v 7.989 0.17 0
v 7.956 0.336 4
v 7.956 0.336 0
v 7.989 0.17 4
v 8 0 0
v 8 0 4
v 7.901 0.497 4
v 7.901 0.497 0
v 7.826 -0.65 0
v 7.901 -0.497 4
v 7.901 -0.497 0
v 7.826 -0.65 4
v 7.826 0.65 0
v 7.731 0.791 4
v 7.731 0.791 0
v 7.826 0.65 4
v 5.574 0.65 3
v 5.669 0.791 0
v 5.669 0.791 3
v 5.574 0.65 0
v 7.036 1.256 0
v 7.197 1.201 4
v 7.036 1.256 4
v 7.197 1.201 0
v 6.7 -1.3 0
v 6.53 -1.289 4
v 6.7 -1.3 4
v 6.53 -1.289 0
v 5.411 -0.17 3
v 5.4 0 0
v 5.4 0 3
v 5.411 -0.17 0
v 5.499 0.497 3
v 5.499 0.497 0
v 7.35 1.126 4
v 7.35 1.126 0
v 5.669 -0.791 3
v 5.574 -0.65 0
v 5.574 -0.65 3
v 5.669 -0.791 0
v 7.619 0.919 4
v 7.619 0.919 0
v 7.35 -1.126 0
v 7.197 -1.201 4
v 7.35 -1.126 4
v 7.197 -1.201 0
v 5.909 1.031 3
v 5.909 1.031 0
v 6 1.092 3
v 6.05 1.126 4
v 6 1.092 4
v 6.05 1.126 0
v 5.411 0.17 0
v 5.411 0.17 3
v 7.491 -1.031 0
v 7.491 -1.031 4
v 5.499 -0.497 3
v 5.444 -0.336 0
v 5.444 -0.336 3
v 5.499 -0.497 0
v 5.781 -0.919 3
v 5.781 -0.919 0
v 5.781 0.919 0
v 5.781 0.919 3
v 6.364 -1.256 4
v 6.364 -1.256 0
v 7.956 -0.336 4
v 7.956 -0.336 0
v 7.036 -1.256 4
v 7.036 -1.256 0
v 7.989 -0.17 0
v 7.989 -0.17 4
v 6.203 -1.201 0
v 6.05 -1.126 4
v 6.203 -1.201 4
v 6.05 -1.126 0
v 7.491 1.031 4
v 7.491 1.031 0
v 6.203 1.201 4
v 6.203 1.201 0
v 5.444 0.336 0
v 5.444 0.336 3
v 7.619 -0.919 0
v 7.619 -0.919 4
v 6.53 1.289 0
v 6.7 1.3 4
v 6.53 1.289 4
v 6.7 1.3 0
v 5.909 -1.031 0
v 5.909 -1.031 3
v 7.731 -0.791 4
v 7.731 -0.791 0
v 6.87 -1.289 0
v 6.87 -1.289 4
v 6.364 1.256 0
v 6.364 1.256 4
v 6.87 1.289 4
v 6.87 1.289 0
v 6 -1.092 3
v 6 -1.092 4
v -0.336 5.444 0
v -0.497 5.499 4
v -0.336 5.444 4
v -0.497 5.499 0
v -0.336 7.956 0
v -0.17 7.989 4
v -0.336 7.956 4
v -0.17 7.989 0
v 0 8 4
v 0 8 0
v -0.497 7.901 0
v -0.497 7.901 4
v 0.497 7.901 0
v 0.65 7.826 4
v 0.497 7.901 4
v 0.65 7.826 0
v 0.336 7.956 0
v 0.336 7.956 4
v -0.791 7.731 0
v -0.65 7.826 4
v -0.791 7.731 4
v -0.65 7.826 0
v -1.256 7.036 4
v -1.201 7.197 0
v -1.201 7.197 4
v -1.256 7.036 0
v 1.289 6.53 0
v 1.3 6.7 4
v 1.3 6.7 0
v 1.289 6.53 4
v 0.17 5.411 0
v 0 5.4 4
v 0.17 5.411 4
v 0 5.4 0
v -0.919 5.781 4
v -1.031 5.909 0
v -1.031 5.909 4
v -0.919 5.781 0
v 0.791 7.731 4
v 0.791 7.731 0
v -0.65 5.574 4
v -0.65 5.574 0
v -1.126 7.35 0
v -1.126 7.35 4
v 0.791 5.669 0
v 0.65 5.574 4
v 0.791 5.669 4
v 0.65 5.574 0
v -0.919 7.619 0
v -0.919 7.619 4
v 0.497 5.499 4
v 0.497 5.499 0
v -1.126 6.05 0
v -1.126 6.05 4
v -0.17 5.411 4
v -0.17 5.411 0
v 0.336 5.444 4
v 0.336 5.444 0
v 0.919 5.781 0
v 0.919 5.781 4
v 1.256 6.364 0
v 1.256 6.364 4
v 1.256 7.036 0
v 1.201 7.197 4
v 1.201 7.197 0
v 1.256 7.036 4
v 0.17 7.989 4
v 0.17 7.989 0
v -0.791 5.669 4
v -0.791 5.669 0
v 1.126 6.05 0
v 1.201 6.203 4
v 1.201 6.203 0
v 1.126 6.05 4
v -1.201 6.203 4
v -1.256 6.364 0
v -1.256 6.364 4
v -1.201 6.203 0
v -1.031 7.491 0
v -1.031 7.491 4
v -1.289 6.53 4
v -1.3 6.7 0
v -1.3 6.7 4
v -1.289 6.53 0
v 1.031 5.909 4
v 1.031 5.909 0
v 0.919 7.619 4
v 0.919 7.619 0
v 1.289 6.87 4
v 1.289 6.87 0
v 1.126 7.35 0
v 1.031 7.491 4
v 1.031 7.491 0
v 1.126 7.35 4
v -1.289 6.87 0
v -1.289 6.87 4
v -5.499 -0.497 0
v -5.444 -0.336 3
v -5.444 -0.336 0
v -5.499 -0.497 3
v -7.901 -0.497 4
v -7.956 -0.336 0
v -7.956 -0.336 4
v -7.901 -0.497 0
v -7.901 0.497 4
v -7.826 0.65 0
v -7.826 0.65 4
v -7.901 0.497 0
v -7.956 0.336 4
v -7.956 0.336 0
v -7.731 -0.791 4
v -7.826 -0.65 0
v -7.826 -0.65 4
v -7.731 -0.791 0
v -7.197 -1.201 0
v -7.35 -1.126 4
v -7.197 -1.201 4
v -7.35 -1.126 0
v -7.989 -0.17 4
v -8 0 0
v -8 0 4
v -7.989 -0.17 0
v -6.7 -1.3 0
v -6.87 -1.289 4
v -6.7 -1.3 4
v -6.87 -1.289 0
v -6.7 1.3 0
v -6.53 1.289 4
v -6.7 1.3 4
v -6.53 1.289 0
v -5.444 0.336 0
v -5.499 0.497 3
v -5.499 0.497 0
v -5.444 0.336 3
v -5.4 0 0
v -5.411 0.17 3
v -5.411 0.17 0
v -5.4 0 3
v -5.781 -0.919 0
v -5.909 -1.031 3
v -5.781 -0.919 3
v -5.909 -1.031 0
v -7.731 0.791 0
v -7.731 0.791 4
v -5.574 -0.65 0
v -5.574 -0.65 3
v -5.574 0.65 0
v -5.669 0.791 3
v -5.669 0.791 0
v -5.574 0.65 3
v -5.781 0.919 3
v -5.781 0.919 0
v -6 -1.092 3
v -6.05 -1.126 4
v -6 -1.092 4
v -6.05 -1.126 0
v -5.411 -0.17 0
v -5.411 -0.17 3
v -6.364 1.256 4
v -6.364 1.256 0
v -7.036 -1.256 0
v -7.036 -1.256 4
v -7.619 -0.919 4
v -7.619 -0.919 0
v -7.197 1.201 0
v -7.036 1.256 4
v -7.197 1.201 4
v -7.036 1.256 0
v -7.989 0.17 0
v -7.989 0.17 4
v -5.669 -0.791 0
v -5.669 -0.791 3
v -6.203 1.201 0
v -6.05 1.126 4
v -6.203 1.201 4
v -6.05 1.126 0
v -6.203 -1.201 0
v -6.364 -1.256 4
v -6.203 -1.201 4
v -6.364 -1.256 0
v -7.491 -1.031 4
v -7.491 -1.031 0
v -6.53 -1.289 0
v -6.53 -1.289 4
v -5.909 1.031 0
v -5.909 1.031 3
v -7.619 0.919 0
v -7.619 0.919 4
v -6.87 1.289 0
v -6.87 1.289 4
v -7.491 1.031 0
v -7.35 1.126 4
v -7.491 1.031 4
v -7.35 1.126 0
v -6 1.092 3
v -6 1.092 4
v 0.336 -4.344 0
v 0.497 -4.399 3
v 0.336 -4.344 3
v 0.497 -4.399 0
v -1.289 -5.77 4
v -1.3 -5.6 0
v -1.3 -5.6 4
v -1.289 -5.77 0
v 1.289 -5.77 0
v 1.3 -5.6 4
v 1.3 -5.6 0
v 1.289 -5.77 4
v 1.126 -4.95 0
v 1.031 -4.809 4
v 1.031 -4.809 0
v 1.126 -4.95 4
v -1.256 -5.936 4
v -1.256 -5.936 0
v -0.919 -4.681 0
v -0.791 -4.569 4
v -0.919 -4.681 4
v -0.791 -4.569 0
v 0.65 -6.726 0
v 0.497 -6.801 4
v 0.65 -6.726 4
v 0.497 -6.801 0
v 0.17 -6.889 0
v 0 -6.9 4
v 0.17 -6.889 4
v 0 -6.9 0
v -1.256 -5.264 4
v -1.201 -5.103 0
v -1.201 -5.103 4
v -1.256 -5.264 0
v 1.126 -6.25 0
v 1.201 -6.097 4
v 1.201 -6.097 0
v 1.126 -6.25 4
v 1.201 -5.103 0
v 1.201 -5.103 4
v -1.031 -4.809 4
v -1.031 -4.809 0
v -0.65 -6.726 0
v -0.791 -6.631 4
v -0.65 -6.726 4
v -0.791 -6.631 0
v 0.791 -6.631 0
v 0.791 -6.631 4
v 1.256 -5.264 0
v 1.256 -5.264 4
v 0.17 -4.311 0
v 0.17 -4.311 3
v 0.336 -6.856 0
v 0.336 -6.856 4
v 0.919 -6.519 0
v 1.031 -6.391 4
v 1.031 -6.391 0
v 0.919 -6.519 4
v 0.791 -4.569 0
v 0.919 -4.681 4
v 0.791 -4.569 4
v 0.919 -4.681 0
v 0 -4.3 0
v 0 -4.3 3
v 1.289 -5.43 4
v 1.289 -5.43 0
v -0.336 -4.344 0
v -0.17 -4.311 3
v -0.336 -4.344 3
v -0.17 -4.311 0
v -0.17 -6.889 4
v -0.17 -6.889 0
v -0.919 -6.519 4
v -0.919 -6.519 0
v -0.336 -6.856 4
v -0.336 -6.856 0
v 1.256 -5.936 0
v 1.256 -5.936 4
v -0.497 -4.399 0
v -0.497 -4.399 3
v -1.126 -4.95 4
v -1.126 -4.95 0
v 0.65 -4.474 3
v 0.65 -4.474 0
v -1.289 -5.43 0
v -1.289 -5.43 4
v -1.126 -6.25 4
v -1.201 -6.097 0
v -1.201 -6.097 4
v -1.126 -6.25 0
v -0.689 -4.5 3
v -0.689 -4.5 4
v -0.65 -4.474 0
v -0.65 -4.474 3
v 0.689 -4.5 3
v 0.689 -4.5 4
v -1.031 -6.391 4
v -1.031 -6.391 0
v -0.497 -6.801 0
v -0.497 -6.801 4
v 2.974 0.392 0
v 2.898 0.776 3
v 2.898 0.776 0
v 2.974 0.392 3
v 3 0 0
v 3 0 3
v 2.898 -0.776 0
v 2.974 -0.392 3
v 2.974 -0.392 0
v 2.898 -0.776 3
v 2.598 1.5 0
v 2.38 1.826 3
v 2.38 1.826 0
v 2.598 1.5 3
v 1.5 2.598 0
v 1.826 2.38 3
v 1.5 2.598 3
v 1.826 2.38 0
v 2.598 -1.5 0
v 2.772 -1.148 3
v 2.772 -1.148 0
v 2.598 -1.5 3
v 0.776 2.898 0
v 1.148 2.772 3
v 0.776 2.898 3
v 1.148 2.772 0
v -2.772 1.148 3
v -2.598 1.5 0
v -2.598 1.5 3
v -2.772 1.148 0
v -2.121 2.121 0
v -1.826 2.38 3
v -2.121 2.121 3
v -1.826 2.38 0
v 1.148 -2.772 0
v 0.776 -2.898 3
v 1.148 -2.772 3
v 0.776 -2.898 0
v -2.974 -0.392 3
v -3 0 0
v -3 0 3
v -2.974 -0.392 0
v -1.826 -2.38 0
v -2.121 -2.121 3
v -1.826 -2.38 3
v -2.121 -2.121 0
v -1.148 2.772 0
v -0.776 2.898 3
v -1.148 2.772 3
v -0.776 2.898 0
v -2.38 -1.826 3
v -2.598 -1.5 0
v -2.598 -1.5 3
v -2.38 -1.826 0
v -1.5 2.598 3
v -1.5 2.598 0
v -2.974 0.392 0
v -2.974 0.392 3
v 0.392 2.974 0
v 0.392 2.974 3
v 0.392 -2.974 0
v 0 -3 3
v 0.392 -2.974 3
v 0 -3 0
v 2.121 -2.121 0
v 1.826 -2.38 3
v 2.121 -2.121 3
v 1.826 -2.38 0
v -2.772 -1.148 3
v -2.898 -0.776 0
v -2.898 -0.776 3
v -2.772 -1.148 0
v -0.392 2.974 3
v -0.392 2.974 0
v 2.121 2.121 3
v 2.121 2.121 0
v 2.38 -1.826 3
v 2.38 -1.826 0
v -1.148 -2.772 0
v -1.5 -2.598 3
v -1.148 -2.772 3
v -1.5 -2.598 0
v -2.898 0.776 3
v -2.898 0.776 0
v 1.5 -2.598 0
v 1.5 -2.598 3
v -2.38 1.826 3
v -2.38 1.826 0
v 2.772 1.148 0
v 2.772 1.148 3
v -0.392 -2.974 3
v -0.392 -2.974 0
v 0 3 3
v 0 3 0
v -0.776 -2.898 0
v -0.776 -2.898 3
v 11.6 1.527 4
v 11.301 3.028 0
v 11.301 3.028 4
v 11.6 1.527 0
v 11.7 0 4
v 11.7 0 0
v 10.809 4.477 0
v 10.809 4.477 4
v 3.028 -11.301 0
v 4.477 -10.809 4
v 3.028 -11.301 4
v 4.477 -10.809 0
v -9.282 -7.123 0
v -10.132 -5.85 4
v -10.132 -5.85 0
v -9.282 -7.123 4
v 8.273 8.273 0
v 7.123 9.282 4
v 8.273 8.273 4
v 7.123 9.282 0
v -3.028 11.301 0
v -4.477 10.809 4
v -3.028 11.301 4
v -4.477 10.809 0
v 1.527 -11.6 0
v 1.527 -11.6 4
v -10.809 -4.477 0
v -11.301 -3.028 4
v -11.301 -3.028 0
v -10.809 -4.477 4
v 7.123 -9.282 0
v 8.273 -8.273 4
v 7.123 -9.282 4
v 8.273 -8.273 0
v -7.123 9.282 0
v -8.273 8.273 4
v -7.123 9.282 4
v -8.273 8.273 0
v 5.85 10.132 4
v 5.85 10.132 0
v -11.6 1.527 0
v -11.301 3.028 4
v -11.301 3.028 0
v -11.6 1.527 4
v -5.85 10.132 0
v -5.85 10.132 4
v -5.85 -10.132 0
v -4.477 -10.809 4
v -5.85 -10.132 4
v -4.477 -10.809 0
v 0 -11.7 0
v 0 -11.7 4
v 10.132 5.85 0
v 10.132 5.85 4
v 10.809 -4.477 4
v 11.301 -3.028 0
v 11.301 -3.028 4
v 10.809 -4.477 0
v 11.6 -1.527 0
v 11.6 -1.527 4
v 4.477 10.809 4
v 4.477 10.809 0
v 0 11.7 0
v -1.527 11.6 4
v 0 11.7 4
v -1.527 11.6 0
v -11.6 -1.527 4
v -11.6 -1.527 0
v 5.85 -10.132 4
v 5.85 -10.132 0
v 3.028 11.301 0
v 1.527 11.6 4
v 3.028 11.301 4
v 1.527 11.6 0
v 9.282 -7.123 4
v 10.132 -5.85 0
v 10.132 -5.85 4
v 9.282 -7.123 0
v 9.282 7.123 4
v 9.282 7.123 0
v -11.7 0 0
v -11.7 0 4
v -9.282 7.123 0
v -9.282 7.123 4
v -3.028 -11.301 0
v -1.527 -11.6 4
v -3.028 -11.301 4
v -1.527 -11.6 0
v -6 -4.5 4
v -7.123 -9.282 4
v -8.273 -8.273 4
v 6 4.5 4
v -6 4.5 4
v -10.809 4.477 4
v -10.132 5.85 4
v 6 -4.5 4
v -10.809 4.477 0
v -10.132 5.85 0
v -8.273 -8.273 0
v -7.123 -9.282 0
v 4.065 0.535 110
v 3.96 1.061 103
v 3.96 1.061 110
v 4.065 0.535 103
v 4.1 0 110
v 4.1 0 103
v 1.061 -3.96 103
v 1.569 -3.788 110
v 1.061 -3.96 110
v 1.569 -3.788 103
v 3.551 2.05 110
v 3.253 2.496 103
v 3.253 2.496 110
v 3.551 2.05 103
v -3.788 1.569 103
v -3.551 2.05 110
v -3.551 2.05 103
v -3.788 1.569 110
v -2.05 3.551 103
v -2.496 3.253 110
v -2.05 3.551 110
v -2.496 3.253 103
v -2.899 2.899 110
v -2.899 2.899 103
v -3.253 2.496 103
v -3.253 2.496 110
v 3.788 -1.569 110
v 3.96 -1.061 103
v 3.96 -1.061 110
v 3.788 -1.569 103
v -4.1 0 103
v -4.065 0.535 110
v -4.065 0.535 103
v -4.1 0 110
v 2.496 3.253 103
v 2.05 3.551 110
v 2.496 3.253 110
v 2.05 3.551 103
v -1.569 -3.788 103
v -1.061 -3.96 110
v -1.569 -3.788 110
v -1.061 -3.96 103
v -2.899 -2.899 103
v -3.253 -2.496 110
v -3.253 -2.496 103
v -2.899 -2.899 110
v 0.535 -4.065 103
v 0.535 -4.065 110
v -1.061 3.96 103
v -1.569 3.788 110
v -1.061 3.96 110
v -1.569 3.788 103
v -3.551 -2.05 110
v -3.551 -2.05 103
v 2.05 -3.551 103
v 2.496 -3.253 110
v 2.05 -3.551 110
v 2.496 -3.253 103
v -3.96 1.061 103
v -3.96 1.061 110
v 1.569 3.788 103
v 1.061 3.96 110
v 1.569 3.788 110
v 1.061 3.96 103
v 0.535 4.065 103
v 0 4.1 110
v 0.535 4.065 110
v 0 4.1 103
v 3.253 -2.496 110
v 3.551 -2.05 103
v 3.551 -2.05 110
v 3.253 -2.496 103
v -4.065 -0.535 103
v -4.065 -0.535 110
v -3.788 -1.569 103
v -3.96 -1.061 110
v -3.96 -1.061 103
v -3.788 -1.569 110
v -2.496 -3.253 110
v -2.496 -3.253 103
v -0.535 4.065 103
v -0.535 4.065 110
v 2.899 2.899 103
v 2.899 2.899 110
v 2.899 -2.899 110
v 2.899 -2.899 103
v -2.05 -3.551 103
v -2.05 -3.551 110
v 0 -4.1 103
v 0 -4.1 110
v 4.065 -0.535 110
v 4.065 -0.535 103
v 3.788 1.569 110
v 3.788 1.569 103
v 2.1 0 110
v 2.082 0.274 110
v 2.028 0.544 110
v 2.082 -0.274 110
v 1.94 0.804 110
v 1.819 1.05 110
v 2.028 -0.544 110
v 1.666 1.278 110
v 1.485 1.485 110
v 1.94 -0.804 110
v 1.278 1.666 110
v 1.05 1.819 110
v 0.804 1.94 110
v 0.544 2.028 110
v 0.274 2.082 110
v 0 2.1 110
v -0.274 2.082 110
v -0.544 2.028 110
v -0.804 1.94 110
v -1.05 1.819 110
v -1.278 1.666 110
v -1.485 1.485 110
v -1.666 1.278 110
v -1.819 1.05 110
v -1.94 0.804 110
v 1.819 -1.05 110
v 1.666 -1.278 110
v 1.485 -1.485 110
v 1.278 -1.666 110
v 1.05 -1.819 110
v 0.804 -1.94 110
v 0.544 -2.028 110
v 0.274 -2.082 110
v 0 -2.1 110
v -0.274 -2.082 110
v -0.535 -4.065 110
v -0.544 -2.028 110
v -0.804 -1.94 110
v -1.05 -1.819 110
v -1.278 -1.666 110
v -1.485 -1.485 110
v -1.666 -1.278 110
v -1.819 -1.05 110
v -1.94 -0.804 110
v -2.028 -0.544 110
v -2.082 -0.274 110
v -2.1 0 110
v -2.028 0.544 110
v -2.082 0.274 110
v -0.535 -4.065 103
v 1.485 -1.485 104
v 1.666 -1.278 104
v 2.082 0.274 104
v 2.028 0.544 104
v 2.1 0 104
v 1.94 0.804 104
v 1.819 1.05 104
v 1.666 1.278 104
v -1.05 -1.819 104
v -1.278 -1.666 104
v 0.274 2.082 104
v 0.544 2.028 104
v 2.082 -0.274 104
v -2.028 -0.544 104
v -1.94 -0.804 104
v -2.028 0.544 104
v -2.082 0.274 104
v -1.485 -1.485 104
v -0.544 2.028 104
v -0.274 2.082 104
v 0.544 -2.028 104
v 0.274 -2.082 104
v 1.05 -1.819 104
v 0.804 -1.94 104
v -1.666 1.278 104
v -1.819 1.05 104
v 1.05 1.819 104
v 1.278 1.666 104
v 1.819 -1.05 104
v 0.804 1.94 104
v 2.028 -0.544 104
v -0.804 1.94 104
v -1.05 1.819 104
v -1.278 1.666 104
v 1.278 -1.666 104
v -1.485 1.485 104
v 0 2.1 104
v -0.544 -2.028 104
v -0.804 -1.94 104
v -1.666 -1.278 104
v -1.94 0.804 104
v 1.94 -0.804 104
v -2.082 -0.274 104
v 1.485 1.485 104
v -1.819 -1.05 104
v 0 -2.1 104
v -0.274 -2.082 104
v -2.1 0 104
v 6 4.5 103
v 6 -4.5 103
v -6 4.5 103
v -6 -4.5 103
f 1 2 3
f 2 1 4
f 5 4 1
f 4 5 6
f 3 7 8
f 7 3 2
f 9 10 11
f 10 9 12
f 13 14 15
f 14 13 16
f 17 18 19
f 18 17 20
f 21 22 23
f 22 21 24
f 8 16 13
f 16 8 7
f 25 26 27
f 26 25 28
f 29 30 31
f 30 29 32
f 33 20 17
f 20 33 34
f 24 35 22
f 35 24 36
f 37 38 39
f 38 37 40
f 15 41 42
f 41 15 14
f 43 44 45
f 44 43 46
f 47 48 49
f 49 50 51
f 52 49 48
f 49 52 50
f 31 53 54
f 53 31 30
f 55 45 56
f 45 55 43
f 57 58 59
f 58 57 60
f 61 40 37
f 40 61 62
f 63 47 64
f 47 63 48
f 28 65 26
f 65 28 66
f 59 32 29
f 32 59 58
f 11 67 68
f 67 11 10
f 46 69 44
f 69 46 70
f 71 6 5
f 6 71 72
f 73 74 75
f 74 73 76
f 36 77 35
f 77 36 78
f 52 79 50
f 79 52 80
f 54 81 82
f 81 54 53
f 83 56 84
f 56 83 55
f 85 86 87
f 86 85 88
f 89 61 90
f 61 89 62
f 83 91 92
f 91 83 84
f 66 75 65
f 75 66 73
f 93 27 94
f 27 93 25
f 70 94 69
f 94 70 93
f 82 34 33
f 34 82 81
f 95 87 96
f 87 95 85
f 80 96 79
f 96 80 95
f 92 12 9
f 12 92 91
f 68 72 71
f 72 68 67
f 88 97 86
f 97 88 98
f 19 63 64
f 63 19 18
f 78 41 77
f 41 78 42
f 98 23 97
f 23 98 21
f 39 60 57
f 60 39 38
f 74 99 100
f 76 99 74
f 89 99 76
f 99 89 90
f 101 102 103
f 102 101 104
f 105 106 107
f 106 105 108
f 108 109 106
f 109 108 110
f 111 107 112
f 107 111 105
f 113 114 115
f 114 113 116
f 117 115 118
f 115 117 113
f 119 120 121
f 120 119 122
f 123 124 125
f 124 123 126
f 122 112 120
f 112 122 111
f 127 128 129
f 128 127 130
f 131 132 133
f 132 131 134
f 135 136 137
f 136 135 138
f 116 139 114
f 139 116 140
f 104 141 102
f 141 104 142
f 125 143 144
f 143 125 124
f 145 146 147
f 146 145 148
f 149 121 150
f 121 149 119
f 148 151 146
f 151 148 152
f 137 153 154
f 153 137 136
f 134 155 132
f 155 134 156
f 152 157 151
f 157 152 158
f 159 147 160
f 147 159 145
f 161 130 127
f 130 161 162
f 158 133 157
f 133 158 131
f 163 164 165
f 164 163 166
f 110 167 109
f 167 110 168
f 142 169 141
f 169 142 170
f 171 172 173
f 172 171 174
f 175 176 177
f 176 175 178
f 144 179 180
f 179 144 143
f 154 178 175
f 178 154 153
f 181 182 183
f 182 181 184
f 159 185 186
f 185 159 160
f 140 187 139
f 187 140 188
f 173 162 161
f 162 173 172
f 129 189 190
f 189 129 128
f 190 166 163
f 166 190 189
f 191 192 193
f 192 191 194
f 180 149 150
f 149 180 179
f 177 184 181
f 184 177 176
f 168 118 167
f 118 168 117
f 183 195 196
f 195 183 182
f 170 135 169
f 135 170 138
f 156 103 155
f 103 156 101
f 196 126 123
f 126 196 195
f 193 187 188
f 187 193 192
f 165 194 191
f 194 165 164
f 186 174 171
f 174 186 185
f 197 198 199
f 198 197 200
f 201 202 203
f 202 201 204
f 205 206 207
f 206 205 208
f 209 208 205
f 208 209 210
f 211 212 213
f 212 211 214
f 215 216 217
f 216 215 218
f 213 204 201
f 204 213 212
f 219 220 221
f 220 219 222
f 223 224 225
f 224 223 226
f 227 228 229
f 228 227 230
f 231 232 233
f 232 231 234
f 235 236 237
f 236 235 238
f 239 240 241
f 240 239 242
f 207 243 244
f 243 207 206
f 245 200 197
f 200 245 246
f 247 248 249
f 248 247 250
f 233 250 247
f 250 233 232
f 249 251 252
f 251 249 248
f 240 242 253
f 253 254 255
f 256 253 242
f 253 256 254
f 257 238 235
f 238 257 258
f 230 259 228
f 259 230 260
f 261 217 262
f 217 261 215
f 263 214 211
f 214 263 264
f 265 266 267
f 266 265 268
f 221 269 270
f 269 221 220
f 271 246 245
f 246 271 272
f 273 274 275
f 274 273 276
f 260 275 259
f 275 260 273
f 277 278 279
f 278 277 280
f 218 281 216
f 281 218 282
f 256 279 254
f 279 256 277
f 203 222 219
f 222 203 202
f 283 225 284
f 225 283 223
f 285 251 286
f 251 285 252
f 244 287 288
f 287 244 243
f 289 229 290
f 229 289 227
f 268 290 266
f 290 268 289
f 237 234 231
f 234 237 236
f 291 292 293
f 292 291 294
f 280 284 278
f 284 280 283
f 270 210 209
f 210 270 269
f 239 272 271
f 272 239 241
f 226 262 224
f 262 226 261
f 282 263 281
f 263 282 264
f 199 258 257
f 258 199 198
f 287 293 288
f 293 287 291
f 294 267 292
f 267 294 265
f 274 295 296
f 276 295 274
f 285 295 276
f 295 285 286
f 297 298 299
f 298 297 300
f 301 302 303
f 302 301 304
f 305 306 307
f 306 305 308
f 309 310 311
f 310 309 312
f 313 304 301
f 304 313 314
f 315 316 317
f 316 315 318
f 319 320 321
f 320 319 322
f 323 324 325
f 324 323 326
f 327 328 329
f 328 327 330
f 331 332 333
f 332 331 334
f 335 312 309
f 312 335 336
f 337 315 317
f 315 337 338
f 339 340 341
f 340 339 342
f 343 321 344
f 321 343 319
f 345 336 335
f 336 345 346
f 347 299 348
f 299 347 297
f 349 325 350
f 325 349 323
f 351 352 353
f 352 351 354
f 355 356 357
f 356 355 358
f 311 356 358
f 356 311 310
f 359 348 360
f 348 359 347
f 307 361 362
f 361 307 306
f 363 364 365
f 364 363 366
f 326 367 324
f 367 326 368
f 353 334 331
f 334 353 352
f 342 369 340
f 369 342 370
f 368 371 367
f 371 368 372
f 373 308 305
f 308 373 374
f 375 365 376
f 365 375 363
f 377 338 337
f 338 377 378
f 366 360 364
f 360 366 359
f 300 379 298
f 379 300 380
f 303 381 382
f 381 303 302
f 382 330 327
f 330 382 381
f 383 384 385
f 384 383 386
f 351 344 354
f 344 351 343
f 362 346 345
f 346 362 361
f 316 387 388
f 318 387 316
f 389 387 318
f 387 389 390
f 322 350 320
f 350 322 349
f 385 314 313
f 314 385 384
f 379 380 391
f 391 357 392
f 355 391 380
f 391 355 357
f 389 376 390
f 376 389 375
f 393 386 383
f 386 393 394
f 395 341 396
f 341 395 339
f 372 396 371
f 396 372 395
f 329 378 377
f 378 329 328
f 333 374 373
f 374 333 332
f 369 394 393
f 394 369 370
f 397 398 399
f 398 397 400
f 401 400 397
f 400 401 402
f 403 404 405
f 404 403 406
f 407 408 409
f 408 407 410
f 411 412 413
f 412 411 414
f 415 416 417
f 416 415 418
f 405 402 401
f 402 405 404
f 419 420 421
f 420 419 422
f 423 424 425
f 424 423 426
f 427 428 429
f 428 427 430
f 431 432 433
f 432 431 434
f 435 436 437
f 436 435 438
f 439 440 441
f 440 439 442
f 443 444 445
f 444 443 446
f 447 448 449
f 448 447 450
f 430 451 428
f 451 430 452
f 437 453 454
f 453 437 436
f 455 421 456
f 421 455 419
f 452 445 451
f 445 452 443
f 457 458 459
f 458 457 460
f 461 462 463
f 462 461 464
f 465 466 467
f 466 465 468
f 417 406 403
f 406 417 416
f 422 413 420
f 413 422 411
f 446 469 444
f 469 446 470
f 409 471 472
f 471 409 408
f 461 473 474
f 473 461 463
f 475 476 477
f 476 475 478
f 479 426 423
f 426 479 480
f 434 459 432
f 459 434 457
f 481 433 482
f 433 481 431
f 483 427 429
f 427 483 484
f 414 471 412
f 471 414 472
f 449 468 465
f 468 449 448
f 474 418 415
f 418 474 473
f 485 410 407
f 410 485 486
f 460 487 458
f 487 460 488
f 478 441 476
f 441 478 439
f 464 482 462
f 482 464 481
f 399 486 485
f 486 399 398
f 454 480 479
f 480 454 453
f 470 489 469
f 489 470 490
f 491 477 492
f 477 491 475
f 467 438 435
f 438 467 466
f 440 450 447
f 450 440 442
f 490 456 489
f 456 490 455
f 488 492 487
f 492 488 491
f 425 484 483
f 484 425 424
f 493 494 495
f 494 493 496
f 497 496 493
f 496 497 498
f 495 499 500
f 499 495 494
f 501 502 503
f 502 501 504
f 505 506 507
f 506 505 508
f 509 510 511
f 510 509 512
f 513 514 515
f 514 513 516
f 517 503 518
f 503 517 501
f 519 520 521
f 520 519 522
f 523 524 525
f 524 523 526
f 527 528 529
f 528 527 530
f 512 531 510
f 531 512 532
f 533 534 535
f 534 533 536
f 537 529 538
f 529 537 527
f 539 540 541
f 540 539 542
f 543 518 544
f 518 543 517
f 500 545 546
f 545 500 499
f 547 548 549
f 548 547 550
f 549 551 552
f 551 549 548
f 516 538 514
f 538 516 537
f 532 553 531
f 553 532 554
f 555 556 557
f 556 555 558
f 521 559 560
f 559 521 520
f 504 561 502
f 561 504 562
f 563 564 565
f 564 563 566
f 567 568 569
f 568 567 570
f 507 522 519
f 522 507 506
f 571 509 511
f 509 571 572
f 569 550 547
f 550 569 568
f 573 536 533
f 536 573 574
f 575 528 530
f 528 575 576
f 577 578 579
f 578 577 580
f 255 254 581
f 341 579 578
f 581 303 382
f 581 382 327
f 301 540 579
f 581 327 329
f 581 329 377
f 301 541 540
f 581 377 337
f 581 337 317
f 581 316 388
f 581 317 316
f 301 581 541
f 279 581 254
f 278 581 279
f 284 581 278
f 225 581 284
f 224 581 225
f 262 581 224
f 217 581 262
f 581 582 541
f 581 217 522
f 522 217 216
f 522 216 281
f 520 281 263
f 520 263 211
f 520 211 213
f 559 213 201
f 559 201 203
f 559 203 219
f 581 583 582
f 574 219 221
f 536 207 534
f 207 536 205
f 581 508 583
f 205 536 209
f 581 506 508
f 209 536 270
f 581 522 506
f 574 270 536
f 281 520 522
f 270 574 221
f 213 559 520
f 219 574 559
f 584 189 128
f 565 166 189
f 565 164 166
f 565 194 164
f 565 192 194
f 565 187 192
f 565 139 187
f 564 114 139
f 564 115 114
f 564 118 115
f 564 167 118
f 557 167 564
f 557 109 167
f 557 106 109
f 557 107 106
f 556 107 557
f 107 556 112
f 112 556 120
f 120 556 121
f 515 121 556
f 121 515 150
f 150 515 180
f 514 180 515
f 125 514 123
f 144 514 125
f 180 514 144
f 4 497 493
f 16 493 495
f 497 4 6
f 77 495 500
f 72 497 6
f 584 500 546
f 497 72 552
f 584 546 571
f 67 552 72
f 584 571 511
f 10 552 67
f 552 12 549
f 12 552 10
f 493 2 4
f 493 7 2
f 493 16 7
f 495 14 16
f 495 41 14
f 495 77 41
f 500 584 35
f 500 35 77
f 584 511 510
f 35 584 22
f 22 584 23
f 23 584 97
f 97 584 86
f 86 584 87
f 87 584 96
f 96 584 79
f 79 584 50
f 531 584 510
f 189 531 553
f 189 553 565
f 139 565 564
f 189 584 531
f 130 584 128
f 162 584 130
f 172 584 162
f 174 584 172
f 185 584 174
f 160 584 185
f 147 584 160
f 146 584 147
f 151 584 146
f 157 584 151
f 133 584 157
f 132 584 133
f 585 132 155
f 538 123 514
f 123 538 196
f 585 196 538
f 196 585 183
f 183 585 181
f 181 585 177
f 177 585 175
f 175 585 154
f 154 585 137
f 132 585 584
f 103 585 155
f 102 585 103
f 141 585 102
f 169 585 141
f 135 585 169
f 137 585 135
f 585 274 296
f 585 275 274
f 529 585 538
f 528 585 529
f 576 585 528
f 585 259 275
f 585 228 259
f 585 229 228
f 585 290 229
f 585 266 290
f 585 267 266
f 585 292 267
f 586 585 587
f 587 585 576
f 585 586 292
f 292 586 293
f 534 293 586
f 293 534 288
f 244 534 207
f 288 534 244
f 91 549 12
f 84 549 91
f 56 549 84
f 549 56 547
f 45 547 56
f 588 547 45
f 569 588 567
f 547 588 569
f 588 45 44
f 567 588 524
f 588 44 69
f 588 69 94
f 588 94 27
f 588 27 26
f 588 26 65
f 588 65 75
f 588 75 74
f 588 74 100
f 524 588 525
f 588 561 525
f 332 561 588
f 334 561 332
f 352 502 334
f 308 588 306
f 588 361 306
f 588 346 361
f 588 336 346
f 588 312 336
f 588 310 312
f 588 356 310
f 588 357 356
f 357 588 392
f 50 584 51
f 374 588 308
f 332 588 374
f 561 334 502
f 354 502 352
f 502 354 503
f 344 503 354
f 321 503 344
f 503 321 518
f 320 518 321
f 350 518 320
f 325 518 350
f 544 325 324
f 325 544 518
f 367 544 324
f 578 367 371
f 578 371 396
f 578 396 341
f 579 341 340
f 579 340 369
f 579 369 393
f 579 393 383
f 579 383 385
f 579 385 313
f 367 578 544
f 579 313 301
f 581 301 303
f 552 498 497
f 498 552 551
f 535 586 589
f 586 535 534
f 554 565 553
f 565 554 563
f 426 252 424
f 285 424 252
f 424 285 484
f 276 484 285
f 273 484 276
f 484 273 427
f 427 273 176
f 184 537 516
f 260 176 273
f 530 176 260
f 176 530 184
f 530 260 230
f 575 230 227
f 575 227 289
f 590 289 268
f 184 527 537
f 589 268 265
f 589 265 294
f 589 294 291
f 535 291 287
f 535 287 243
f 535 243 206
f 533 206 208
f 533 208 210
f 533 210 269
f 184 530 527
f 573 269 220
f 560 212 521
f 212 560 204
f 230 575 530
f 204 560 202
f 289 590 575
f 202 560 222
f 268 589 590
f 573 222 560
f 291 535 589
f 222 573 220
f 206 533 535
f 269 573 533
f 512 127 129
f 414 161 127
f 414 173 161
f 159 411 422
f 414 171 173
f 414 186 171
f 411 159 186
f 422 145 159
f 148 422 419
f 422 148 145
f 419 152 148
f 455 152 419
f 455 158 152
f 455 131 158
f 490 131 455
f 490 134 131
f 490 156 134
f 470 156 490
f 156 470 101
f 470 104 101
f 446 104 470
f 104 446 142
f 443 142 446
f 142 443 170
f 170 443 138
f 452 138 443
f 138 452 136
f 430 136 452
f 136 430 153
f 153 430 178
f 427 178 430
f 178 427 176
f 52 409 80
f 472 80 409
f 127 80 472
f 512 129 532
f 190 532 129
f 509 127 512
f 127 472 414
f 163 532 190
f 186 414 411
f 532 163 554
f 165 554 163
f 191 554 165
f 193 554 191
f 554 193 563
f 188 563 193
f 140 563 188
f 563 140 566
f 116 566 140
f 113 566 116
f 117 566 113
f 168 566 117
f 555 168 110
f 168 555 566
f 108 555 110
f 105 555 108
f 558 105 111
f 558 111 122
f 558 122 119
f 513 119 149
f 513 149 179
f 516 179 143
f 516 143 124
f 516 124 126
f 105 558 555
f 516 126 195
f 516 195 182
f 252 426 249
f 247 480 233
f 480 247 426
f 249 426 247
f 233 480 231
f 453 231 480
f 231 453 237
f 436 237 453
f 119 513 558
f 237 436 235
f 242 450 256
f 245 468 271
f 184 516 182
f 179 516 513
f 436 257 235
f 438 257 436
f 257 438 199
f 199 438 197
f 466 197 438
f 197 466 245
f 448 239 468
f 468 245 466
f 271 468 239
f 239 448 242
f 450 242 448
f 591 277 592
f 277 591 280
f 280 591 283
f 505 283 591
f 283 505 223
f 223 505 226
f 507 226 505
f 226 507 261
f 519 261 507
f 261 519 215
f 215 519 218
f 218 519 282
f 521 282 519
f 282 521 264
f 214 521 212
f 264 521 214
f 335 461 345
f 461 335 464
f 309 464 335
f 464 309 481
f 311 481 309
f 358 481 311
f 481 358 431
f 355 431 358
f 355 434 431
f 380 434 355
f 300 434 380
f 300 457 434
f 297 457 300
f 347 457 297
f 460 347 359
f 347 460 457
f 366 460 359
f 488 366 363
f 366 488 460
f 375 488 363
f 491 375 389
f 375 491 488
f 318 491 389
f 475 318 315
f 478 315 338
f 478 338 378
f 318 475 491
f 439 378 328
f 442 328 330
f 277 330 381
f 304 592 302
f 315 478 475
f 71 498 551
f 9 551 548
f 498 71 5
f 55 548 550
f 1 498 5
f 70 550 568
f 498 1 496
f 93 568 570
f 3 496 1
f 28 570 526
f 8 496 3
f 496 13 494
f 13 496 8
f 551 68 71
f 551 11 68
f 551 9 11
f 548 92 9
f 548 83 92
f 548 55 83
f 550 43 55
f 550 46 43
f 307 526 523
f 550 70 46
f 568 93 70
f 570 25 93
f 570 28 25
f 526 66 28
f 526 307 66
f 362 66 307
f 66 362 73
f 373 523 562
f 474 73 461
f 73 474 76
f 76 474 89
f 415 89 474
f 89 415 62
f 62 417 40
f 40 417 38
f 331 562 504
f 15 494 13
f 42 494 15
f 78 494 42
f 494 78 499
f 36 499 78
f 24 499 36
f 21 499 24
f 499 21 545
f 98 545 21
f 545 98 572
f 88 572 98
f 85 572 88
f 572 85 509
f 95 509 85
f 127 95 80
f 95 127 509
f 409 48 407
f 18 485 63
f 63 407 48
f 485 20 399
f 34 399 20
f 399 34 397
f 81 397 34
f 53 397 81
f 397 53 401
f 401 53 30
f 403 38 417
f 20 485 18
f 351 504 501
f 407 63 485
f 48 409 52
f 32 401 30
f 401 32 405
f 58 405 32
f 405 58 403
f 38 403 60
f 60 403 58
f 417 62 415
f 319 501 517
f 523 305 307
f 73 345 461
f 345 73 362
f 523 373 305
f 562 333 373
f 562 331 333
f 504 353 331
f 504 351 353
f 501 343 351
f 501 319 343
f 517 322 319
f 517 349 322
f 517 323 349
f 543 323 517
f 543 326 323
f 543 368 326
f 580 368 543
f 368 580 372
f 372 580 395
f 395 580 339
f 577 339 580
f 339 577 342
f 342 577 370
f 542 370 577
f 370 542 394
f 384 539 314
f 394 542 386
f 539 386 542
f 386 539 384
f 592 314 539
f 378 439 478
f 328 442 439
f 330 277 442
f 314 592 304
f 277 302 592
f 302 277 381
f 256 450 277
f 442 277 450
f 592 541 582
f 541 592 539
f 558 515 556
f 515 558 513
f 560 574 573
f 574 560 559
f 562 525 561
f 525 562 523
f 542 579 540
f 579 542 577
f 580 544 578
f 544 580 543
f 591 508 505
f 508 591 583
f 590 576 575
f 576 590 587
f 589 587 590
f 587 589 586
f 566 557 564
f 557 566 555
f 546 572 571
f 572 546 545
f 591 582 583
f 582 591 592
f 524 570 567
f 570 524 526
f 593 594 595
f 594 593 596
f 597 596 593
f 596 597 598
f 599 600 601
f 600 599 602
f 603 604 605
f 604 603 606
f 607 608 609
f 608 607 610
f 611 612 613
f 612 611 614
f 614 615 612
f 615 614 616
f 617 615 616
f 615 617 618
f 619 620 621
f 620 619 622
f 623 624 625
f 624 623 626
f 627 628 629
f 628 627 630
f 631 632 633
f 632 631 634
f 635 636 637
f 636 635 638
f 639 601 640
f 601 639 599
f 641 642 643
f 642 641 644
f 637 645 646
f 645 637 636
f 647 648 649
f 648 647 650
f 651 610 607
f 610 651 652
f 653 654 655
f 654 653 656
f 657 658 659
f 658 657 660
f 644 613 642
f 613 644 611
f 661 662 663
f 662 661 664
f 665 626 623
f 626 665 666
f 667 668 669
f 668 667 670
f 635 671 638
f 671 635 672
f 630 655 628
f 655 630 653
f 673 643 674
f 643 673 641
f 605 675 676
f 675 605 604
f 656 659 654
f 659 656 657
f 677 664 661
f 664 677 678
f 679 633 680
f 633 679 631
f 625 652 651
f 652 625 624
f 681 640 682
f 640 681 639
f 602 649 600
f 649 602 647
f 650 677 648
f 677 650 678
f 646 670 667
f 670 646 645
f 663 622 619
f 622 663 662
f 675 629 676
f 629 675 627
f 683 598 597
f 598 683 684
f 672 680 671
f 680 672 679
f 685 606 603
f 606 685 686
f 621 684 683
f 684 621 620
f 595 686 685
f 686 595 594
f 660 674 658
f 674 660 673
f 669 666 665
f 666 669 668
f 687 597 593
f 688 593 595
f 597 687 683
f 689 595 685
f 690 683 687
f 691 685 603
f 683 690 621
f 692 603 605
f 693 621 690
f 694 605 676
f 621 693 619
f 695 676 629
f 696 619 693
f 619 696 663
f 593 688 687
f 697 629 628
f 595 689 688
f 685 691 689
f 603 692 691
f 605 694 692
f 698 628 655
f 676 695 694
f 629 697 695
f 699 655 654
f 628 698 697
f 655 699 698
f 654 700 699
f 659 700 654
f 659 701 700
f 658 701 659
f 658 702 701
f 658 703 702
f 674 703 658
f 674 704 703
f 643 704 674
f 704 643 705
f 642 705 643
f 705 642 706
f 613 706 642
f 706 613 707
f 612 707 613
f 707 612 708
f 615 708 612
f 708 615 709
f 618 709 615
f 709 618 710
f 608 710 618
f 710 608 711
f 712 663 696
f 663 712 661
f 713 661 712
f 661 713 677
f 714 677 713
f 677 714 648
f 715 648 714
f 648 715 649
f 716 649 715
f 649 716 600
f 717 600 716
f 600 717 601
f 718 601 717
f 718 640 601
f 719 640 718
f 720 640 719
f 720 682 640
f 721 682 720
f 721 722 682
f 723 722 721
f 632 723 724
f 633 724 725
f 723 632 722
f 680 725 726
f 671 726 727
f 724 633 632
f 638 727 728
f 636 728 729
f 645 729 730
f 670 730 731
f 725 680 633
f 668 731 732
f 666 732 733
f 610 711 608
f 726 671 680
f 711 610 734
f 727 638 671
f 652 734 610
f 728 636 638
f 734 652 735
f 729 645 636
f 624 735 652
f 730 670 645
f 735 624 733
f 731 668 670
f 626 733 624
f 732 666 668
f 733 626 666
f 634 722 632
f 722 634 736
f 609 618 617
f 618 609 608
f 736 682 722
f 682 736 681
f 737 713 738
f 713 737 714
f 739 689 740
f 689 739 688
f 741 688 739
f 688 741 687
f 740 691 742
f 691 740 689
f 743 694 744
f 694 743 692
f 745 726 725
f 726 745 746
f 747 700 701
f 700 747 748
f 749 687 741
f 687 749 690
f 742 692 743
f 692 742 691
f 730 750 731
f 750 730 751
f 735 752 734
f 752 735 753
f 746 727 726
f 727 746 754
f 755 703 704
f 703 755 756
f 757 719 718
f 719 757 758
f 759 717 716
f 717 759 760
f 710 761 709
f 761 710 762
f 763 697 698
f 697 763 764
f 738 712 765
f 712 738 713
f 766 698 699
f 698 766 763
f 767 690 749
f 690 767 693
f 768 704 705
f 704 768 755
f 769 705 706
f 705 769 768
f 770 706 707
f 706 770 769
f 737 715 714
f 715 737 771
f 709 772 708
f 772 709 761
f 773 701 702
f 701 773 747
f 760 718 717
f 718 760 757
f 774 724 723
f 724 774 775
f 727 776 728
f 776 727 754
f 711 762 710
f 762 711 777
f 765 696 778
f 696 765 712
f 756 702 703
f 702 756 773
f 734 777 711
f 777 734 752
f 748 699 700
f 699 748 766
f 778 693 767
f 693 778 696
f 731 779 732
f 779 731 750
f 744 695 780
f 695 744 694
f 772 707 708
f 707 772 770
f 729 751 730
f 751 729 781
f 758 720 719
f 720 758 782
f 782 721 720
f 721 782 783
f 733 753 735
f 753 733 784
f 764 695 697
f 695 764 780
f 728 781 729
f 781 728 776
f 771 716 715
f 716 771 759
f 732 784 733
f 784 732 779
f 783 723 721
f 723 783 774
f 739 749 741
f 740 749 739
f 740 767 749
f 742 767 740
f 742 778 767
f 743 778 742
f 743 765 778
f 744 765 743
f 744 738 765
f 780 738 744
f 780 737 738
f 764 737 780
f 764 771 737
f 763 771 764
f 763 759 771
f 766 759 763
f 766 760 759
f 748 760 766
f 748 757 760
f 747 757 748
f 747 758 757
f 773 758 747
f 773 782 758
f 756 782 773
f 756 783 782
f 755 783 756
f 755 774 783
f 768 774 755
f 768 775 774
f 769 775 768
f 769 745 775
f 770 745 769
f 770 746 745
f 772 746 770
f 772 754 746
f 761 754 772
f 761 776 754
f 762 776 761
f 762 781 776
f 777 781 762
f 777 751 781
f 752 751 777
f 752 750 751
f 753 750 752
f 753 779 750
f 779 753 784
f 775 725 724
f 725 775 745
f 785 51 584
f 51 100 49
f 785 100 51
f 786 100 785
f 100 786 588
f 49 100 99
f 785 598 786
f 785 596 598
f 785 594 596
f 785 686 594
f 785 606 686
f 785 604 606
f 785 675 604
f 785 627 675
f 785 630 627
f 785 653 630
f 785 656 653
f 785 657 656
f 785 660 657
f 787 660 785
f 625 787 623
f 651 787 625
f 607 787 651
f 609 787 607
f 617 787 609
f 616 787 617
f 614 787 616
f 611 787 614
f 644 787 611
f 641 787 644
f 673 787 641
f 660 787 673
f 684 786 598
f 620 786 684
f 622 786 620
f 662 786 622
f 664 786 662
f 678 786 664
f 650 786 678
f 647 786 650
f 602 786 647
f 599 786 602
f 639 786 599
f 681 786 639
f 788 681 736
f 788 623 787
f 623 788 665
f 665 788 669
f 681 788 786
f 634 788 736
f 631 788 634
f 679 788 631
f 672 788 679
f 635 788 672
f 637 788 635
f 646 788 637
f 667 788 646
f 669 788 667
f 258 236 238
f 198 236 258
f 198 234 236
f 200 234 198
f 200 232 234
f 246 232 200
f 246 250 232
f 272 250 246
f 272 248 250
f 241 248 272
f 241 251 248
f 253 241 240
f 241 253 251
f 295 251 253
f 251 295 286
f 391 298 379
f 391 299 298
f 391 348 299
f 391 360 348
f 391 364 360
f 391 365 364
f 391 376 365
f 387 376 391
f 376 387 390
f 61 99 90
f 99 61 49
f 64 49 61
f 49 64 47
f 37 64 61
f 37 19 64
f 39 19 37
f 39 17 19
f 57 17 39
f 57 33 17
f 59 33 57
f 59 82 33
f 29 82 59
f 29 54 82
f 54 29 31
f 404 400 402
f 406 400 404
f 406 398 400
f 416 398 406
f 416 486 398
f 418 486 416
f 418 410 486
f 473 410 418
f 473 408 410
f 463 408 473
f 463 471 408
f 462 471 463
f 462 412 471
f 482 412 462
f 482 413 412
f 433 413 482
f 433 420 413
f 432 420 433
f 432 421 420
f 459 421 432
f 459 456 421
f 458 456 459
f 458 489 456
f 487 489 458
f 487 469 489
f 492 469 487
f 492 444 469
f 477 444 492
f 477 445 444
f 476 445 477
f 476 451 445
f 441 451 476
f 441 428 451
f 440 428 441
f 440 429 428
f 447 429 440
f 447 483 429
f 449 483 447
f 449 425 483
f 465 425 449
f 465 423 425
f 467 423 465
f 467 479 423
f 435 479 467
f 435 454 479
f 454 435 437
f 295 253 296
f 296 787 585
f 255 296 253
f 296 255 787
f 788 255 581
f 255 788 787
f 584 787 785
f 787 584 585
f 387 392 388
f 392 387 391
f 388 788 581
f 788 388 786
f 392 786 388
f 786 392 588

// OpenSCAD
// file: helpers.scad
// Shared building blocks. Convention: every part's own joint-to-joint axis
// is local Z, so end plates are naturally perpendicular to it and holes bore
// straight along Z. Whole parts get rotated into the world only when placed
// into an assembly view - never inside a single part's own file.
include <params.scad>

// A boss with a heat-set-insert bore, sized to sit inside a wall.
module insert_boss(h) {
    difference() {
        cylinder(d = insert_d + wall, h = h);
        translate([0, 0, h - insert_depth])
            cylinder(d = insert_d, h = insert_depth + 0.1);
    }
}

// Four insert bosses in a rectangle, base sitting on z=0.
module bolt_pattern(x, y, h) {
    for (sx = [-1, 1]) for (sy = [-1, 1])
        translate([sx * x / 2, sy * y / 2, 0]) insert_boss(h);
}

// Clearance holes through a slab of thickness h, for the mating part.
module bolt_holes(x, y, d, h) {
    for (sx = [-1, 1]) for (sy = [-1, 1])
        translate([sx * x / 2, sy * y / 2, -0.1]) cylinder(d = d, h = h + 0.2);
}

// Horn-side bolt circle, holes along Z, through a slab of thickness h - see
// params.scad for why the fourth hole sits at a smaller radius.
module horn_bolt_circle(h) {
    for (a = [0, 90, 180]) rotate([0, 0, a])
        translate([horn_bolt_r_major, 0, -0.1]) cylinder(d = horn_bolt_d, h = h + 0.2);
    rotate([0, 0, 270]) translate([horn_bolt_r_minor, 0, -0.1])
        cylinder(d = horn_bolt_d, h = h + 0.2);
    translate([0, 0, -0.1]) cylinder(d = horn_hub_d, h = h + 0.2);
}

// A round plate carrying the horn bolt circle, face normal along Z, sitting
// at z=[0,h]. This is what a leg segment bolts to a servo's rotating horn.
module horn_plate(h) {
    d = horn_bolt_r_major * 2 + 10;
    difference() {
        cylinder(d = d, h = h);
        horn_bolt_circle(h);
    }
}

// A square plate carrying the bracket's own flange holes - ADJUSTABLE, see
// params.scad. This is what a leg segment bolts to the downloaded bracket.
module bracket_plate(h) {
    side = bracket_hole_x + 12;
    difference() {
        translate([-side / 2, -side / 2, 0]) cube([side, side, h]);
        bolt_holes(bracket_hole_x, bracket_hole_y, bracket_screw_d, h);
    }
}

// The ST3215 body pocket: servo drops in from the open top, its case (not
// the gearbox) bearing on the lip.
module servo_pocket(depth) {
    l = servo_l + 2 * servo_fit;
    w = servo_w + 2 * servo_fit;
    translate([-l / 2, -w / 2, 0]) cube([l, w, depth + 0.1]);
}
// file: params.scad
// ==================== source of truth ====================
// Every VERIFIED number below is cross-referenced to either this repo's own
// simulation model (src/robot_cat_description/urdf/cat.urdf.xacro at scale
// 1.0, and robot_cat_gait/leg_ik.py) or an independently checked datasheet -
// see hardware/cad/README.md for exactly what was checked and against what.
//
// ADJUSTABLE numbers are flagged because the one thing they depend on - the
// downloaded servo bracket's own mounting face - could not be fetched from
// Printables/Thingiverse in this session (both block automated access).
// Print ONE part that uses an ADJUSTABLE value, hold it against the real
// bracket, correct the number, then print the rest. Everything else here is
// safe to print in full sets straight away.

// ---- leg geometry - VERIFIED, must match leg_ik.py exactly ----
thigh_length = 110;   // LegGeometry.thigh_length, axis to axis
calf_length  = 110;   // LegGeometry.calf_length, axis to paw centre
hip_offset   = 25;    // hip roll axis -> thigh pitch axis, lateral
foot_radius  = 12;    // paw pad sphere radius

// ---- trunk geometry - VERIFIED ----
hip_x = 110;          // hip mount, x from body centre (so 220mm hip-to-hip)
hip_y = 55;           // hip mount, y from body centre (so 110mm hip-to-hip)
body_length = 300;
body_width  = 111;
body_height = 141;

// ---- ST3215 servo body - VERIFIED: DFRobot product page (2962) and
// servodatabase.com both give 45.2 x 24.7 x 35.0 mm ----
servo_l = 45.2;
servo_w = 24.7;
servo_h = 35.0;
servo_fit = 0.4;      // FDM clearance added per side around the pocket

// ---- Raspberry Pi 5 mounting - VERIFIED against the official Raspberry Pi
// Ltd mechanical drawing (RP-008347-DS-1): 58 x 49mm hole spacing, Ø2.7mm
// holes (clearance for M2.5) ----
pi_hole_x = 58;
pi_hole_y = 49;
pi_hole_d = 2.9;       // add a touch over the datasheet 2.7 for FDM tolerance

// ---- ADJUSTABLE: servo horn bolt circle ----
// Reverse-measured from a real, printed, STS3215-based quadruped
// (github.com/garciamathias/OpenRoboticDog, hip_x4.stl) - NOT the servo
// datasheet, because no datasheet with this number could be reached. Four
// holes: three at 6.7mm radius, one at 5.6mm (verified asymmetric - this is
// what the real mesh measured, not a rounding choice). Treat this as a
// well-informed starting point, not gospel: confirm on the physical horn
// before drilling the rest.
horn_bolt_r_major = 6.7;
horn_bolt_r_minor = 5.6;   // the fourth hole sits closer to centre
horn_bolt_d = 2.6;         // self-tapping screw clearance
horn_hub_d = 6.0;          // splined output shaft boss, servo horn already has this - clearance only

// ---- ADJUSTABLE: bracket-to-frame flange ----
// Printables 653674 is described as exposing "4 standard M3 machine screws"
// on its outward face once mounted to the servo, but the exact spacing could
// not be fetched (site returns 403 to automated tools). Starting guess sized
// to comfortably clear the servo body's 24.7mm width. CONFIRM AND CORRECT
// against the downloaded bracket before printing the rest.
bracket_hole_x = 20;
bracket_hole_y = 16;
bracket_screw_d = 3.4;    // M3 clearance

// ---- print structure ----
wall = 4;             // load-bearing wall thickness in PETG
insert_d = 4.2;        // M3 brass heat-set insert bore
insert_depth = 6;
$fn = 48;
// main file
// Segment goleni (calf_link). From the knee servo's horn (ID3, drives this
// part) to the paw. Unpowered - no servo at the far end, which is why this
// segment is light: 37g in the mass budget against the thigh's 109g.
// 110mm axle-to-paw-centre - VERIFIED, must equal calf_length in leg_ik.py.
//
// The far end is a stub with a single insert, not a bracket: the paw pad
// bolts on with one M3 screw so it stays "wymienna, nie klejona" per
// montaz.pdf - a wearing part, replaced without reprinting the leg.
include <params.scad>
include <helpers.scad>

spine_w = 12;
spine_h = 9;
stub_h = wall * 2;

module calf_segment() {
    union() {
        horn_plate(wall);
        translate([0, 0, calf_length - stub_h]) insert_boss(stub_h);
        translate([-spine_w / 2, -spine_h / 2, wall - 1])
            cube([spine_w, spine_h, calf_length - stub_h - wall + 2]);
    }
}

calf_segment();
